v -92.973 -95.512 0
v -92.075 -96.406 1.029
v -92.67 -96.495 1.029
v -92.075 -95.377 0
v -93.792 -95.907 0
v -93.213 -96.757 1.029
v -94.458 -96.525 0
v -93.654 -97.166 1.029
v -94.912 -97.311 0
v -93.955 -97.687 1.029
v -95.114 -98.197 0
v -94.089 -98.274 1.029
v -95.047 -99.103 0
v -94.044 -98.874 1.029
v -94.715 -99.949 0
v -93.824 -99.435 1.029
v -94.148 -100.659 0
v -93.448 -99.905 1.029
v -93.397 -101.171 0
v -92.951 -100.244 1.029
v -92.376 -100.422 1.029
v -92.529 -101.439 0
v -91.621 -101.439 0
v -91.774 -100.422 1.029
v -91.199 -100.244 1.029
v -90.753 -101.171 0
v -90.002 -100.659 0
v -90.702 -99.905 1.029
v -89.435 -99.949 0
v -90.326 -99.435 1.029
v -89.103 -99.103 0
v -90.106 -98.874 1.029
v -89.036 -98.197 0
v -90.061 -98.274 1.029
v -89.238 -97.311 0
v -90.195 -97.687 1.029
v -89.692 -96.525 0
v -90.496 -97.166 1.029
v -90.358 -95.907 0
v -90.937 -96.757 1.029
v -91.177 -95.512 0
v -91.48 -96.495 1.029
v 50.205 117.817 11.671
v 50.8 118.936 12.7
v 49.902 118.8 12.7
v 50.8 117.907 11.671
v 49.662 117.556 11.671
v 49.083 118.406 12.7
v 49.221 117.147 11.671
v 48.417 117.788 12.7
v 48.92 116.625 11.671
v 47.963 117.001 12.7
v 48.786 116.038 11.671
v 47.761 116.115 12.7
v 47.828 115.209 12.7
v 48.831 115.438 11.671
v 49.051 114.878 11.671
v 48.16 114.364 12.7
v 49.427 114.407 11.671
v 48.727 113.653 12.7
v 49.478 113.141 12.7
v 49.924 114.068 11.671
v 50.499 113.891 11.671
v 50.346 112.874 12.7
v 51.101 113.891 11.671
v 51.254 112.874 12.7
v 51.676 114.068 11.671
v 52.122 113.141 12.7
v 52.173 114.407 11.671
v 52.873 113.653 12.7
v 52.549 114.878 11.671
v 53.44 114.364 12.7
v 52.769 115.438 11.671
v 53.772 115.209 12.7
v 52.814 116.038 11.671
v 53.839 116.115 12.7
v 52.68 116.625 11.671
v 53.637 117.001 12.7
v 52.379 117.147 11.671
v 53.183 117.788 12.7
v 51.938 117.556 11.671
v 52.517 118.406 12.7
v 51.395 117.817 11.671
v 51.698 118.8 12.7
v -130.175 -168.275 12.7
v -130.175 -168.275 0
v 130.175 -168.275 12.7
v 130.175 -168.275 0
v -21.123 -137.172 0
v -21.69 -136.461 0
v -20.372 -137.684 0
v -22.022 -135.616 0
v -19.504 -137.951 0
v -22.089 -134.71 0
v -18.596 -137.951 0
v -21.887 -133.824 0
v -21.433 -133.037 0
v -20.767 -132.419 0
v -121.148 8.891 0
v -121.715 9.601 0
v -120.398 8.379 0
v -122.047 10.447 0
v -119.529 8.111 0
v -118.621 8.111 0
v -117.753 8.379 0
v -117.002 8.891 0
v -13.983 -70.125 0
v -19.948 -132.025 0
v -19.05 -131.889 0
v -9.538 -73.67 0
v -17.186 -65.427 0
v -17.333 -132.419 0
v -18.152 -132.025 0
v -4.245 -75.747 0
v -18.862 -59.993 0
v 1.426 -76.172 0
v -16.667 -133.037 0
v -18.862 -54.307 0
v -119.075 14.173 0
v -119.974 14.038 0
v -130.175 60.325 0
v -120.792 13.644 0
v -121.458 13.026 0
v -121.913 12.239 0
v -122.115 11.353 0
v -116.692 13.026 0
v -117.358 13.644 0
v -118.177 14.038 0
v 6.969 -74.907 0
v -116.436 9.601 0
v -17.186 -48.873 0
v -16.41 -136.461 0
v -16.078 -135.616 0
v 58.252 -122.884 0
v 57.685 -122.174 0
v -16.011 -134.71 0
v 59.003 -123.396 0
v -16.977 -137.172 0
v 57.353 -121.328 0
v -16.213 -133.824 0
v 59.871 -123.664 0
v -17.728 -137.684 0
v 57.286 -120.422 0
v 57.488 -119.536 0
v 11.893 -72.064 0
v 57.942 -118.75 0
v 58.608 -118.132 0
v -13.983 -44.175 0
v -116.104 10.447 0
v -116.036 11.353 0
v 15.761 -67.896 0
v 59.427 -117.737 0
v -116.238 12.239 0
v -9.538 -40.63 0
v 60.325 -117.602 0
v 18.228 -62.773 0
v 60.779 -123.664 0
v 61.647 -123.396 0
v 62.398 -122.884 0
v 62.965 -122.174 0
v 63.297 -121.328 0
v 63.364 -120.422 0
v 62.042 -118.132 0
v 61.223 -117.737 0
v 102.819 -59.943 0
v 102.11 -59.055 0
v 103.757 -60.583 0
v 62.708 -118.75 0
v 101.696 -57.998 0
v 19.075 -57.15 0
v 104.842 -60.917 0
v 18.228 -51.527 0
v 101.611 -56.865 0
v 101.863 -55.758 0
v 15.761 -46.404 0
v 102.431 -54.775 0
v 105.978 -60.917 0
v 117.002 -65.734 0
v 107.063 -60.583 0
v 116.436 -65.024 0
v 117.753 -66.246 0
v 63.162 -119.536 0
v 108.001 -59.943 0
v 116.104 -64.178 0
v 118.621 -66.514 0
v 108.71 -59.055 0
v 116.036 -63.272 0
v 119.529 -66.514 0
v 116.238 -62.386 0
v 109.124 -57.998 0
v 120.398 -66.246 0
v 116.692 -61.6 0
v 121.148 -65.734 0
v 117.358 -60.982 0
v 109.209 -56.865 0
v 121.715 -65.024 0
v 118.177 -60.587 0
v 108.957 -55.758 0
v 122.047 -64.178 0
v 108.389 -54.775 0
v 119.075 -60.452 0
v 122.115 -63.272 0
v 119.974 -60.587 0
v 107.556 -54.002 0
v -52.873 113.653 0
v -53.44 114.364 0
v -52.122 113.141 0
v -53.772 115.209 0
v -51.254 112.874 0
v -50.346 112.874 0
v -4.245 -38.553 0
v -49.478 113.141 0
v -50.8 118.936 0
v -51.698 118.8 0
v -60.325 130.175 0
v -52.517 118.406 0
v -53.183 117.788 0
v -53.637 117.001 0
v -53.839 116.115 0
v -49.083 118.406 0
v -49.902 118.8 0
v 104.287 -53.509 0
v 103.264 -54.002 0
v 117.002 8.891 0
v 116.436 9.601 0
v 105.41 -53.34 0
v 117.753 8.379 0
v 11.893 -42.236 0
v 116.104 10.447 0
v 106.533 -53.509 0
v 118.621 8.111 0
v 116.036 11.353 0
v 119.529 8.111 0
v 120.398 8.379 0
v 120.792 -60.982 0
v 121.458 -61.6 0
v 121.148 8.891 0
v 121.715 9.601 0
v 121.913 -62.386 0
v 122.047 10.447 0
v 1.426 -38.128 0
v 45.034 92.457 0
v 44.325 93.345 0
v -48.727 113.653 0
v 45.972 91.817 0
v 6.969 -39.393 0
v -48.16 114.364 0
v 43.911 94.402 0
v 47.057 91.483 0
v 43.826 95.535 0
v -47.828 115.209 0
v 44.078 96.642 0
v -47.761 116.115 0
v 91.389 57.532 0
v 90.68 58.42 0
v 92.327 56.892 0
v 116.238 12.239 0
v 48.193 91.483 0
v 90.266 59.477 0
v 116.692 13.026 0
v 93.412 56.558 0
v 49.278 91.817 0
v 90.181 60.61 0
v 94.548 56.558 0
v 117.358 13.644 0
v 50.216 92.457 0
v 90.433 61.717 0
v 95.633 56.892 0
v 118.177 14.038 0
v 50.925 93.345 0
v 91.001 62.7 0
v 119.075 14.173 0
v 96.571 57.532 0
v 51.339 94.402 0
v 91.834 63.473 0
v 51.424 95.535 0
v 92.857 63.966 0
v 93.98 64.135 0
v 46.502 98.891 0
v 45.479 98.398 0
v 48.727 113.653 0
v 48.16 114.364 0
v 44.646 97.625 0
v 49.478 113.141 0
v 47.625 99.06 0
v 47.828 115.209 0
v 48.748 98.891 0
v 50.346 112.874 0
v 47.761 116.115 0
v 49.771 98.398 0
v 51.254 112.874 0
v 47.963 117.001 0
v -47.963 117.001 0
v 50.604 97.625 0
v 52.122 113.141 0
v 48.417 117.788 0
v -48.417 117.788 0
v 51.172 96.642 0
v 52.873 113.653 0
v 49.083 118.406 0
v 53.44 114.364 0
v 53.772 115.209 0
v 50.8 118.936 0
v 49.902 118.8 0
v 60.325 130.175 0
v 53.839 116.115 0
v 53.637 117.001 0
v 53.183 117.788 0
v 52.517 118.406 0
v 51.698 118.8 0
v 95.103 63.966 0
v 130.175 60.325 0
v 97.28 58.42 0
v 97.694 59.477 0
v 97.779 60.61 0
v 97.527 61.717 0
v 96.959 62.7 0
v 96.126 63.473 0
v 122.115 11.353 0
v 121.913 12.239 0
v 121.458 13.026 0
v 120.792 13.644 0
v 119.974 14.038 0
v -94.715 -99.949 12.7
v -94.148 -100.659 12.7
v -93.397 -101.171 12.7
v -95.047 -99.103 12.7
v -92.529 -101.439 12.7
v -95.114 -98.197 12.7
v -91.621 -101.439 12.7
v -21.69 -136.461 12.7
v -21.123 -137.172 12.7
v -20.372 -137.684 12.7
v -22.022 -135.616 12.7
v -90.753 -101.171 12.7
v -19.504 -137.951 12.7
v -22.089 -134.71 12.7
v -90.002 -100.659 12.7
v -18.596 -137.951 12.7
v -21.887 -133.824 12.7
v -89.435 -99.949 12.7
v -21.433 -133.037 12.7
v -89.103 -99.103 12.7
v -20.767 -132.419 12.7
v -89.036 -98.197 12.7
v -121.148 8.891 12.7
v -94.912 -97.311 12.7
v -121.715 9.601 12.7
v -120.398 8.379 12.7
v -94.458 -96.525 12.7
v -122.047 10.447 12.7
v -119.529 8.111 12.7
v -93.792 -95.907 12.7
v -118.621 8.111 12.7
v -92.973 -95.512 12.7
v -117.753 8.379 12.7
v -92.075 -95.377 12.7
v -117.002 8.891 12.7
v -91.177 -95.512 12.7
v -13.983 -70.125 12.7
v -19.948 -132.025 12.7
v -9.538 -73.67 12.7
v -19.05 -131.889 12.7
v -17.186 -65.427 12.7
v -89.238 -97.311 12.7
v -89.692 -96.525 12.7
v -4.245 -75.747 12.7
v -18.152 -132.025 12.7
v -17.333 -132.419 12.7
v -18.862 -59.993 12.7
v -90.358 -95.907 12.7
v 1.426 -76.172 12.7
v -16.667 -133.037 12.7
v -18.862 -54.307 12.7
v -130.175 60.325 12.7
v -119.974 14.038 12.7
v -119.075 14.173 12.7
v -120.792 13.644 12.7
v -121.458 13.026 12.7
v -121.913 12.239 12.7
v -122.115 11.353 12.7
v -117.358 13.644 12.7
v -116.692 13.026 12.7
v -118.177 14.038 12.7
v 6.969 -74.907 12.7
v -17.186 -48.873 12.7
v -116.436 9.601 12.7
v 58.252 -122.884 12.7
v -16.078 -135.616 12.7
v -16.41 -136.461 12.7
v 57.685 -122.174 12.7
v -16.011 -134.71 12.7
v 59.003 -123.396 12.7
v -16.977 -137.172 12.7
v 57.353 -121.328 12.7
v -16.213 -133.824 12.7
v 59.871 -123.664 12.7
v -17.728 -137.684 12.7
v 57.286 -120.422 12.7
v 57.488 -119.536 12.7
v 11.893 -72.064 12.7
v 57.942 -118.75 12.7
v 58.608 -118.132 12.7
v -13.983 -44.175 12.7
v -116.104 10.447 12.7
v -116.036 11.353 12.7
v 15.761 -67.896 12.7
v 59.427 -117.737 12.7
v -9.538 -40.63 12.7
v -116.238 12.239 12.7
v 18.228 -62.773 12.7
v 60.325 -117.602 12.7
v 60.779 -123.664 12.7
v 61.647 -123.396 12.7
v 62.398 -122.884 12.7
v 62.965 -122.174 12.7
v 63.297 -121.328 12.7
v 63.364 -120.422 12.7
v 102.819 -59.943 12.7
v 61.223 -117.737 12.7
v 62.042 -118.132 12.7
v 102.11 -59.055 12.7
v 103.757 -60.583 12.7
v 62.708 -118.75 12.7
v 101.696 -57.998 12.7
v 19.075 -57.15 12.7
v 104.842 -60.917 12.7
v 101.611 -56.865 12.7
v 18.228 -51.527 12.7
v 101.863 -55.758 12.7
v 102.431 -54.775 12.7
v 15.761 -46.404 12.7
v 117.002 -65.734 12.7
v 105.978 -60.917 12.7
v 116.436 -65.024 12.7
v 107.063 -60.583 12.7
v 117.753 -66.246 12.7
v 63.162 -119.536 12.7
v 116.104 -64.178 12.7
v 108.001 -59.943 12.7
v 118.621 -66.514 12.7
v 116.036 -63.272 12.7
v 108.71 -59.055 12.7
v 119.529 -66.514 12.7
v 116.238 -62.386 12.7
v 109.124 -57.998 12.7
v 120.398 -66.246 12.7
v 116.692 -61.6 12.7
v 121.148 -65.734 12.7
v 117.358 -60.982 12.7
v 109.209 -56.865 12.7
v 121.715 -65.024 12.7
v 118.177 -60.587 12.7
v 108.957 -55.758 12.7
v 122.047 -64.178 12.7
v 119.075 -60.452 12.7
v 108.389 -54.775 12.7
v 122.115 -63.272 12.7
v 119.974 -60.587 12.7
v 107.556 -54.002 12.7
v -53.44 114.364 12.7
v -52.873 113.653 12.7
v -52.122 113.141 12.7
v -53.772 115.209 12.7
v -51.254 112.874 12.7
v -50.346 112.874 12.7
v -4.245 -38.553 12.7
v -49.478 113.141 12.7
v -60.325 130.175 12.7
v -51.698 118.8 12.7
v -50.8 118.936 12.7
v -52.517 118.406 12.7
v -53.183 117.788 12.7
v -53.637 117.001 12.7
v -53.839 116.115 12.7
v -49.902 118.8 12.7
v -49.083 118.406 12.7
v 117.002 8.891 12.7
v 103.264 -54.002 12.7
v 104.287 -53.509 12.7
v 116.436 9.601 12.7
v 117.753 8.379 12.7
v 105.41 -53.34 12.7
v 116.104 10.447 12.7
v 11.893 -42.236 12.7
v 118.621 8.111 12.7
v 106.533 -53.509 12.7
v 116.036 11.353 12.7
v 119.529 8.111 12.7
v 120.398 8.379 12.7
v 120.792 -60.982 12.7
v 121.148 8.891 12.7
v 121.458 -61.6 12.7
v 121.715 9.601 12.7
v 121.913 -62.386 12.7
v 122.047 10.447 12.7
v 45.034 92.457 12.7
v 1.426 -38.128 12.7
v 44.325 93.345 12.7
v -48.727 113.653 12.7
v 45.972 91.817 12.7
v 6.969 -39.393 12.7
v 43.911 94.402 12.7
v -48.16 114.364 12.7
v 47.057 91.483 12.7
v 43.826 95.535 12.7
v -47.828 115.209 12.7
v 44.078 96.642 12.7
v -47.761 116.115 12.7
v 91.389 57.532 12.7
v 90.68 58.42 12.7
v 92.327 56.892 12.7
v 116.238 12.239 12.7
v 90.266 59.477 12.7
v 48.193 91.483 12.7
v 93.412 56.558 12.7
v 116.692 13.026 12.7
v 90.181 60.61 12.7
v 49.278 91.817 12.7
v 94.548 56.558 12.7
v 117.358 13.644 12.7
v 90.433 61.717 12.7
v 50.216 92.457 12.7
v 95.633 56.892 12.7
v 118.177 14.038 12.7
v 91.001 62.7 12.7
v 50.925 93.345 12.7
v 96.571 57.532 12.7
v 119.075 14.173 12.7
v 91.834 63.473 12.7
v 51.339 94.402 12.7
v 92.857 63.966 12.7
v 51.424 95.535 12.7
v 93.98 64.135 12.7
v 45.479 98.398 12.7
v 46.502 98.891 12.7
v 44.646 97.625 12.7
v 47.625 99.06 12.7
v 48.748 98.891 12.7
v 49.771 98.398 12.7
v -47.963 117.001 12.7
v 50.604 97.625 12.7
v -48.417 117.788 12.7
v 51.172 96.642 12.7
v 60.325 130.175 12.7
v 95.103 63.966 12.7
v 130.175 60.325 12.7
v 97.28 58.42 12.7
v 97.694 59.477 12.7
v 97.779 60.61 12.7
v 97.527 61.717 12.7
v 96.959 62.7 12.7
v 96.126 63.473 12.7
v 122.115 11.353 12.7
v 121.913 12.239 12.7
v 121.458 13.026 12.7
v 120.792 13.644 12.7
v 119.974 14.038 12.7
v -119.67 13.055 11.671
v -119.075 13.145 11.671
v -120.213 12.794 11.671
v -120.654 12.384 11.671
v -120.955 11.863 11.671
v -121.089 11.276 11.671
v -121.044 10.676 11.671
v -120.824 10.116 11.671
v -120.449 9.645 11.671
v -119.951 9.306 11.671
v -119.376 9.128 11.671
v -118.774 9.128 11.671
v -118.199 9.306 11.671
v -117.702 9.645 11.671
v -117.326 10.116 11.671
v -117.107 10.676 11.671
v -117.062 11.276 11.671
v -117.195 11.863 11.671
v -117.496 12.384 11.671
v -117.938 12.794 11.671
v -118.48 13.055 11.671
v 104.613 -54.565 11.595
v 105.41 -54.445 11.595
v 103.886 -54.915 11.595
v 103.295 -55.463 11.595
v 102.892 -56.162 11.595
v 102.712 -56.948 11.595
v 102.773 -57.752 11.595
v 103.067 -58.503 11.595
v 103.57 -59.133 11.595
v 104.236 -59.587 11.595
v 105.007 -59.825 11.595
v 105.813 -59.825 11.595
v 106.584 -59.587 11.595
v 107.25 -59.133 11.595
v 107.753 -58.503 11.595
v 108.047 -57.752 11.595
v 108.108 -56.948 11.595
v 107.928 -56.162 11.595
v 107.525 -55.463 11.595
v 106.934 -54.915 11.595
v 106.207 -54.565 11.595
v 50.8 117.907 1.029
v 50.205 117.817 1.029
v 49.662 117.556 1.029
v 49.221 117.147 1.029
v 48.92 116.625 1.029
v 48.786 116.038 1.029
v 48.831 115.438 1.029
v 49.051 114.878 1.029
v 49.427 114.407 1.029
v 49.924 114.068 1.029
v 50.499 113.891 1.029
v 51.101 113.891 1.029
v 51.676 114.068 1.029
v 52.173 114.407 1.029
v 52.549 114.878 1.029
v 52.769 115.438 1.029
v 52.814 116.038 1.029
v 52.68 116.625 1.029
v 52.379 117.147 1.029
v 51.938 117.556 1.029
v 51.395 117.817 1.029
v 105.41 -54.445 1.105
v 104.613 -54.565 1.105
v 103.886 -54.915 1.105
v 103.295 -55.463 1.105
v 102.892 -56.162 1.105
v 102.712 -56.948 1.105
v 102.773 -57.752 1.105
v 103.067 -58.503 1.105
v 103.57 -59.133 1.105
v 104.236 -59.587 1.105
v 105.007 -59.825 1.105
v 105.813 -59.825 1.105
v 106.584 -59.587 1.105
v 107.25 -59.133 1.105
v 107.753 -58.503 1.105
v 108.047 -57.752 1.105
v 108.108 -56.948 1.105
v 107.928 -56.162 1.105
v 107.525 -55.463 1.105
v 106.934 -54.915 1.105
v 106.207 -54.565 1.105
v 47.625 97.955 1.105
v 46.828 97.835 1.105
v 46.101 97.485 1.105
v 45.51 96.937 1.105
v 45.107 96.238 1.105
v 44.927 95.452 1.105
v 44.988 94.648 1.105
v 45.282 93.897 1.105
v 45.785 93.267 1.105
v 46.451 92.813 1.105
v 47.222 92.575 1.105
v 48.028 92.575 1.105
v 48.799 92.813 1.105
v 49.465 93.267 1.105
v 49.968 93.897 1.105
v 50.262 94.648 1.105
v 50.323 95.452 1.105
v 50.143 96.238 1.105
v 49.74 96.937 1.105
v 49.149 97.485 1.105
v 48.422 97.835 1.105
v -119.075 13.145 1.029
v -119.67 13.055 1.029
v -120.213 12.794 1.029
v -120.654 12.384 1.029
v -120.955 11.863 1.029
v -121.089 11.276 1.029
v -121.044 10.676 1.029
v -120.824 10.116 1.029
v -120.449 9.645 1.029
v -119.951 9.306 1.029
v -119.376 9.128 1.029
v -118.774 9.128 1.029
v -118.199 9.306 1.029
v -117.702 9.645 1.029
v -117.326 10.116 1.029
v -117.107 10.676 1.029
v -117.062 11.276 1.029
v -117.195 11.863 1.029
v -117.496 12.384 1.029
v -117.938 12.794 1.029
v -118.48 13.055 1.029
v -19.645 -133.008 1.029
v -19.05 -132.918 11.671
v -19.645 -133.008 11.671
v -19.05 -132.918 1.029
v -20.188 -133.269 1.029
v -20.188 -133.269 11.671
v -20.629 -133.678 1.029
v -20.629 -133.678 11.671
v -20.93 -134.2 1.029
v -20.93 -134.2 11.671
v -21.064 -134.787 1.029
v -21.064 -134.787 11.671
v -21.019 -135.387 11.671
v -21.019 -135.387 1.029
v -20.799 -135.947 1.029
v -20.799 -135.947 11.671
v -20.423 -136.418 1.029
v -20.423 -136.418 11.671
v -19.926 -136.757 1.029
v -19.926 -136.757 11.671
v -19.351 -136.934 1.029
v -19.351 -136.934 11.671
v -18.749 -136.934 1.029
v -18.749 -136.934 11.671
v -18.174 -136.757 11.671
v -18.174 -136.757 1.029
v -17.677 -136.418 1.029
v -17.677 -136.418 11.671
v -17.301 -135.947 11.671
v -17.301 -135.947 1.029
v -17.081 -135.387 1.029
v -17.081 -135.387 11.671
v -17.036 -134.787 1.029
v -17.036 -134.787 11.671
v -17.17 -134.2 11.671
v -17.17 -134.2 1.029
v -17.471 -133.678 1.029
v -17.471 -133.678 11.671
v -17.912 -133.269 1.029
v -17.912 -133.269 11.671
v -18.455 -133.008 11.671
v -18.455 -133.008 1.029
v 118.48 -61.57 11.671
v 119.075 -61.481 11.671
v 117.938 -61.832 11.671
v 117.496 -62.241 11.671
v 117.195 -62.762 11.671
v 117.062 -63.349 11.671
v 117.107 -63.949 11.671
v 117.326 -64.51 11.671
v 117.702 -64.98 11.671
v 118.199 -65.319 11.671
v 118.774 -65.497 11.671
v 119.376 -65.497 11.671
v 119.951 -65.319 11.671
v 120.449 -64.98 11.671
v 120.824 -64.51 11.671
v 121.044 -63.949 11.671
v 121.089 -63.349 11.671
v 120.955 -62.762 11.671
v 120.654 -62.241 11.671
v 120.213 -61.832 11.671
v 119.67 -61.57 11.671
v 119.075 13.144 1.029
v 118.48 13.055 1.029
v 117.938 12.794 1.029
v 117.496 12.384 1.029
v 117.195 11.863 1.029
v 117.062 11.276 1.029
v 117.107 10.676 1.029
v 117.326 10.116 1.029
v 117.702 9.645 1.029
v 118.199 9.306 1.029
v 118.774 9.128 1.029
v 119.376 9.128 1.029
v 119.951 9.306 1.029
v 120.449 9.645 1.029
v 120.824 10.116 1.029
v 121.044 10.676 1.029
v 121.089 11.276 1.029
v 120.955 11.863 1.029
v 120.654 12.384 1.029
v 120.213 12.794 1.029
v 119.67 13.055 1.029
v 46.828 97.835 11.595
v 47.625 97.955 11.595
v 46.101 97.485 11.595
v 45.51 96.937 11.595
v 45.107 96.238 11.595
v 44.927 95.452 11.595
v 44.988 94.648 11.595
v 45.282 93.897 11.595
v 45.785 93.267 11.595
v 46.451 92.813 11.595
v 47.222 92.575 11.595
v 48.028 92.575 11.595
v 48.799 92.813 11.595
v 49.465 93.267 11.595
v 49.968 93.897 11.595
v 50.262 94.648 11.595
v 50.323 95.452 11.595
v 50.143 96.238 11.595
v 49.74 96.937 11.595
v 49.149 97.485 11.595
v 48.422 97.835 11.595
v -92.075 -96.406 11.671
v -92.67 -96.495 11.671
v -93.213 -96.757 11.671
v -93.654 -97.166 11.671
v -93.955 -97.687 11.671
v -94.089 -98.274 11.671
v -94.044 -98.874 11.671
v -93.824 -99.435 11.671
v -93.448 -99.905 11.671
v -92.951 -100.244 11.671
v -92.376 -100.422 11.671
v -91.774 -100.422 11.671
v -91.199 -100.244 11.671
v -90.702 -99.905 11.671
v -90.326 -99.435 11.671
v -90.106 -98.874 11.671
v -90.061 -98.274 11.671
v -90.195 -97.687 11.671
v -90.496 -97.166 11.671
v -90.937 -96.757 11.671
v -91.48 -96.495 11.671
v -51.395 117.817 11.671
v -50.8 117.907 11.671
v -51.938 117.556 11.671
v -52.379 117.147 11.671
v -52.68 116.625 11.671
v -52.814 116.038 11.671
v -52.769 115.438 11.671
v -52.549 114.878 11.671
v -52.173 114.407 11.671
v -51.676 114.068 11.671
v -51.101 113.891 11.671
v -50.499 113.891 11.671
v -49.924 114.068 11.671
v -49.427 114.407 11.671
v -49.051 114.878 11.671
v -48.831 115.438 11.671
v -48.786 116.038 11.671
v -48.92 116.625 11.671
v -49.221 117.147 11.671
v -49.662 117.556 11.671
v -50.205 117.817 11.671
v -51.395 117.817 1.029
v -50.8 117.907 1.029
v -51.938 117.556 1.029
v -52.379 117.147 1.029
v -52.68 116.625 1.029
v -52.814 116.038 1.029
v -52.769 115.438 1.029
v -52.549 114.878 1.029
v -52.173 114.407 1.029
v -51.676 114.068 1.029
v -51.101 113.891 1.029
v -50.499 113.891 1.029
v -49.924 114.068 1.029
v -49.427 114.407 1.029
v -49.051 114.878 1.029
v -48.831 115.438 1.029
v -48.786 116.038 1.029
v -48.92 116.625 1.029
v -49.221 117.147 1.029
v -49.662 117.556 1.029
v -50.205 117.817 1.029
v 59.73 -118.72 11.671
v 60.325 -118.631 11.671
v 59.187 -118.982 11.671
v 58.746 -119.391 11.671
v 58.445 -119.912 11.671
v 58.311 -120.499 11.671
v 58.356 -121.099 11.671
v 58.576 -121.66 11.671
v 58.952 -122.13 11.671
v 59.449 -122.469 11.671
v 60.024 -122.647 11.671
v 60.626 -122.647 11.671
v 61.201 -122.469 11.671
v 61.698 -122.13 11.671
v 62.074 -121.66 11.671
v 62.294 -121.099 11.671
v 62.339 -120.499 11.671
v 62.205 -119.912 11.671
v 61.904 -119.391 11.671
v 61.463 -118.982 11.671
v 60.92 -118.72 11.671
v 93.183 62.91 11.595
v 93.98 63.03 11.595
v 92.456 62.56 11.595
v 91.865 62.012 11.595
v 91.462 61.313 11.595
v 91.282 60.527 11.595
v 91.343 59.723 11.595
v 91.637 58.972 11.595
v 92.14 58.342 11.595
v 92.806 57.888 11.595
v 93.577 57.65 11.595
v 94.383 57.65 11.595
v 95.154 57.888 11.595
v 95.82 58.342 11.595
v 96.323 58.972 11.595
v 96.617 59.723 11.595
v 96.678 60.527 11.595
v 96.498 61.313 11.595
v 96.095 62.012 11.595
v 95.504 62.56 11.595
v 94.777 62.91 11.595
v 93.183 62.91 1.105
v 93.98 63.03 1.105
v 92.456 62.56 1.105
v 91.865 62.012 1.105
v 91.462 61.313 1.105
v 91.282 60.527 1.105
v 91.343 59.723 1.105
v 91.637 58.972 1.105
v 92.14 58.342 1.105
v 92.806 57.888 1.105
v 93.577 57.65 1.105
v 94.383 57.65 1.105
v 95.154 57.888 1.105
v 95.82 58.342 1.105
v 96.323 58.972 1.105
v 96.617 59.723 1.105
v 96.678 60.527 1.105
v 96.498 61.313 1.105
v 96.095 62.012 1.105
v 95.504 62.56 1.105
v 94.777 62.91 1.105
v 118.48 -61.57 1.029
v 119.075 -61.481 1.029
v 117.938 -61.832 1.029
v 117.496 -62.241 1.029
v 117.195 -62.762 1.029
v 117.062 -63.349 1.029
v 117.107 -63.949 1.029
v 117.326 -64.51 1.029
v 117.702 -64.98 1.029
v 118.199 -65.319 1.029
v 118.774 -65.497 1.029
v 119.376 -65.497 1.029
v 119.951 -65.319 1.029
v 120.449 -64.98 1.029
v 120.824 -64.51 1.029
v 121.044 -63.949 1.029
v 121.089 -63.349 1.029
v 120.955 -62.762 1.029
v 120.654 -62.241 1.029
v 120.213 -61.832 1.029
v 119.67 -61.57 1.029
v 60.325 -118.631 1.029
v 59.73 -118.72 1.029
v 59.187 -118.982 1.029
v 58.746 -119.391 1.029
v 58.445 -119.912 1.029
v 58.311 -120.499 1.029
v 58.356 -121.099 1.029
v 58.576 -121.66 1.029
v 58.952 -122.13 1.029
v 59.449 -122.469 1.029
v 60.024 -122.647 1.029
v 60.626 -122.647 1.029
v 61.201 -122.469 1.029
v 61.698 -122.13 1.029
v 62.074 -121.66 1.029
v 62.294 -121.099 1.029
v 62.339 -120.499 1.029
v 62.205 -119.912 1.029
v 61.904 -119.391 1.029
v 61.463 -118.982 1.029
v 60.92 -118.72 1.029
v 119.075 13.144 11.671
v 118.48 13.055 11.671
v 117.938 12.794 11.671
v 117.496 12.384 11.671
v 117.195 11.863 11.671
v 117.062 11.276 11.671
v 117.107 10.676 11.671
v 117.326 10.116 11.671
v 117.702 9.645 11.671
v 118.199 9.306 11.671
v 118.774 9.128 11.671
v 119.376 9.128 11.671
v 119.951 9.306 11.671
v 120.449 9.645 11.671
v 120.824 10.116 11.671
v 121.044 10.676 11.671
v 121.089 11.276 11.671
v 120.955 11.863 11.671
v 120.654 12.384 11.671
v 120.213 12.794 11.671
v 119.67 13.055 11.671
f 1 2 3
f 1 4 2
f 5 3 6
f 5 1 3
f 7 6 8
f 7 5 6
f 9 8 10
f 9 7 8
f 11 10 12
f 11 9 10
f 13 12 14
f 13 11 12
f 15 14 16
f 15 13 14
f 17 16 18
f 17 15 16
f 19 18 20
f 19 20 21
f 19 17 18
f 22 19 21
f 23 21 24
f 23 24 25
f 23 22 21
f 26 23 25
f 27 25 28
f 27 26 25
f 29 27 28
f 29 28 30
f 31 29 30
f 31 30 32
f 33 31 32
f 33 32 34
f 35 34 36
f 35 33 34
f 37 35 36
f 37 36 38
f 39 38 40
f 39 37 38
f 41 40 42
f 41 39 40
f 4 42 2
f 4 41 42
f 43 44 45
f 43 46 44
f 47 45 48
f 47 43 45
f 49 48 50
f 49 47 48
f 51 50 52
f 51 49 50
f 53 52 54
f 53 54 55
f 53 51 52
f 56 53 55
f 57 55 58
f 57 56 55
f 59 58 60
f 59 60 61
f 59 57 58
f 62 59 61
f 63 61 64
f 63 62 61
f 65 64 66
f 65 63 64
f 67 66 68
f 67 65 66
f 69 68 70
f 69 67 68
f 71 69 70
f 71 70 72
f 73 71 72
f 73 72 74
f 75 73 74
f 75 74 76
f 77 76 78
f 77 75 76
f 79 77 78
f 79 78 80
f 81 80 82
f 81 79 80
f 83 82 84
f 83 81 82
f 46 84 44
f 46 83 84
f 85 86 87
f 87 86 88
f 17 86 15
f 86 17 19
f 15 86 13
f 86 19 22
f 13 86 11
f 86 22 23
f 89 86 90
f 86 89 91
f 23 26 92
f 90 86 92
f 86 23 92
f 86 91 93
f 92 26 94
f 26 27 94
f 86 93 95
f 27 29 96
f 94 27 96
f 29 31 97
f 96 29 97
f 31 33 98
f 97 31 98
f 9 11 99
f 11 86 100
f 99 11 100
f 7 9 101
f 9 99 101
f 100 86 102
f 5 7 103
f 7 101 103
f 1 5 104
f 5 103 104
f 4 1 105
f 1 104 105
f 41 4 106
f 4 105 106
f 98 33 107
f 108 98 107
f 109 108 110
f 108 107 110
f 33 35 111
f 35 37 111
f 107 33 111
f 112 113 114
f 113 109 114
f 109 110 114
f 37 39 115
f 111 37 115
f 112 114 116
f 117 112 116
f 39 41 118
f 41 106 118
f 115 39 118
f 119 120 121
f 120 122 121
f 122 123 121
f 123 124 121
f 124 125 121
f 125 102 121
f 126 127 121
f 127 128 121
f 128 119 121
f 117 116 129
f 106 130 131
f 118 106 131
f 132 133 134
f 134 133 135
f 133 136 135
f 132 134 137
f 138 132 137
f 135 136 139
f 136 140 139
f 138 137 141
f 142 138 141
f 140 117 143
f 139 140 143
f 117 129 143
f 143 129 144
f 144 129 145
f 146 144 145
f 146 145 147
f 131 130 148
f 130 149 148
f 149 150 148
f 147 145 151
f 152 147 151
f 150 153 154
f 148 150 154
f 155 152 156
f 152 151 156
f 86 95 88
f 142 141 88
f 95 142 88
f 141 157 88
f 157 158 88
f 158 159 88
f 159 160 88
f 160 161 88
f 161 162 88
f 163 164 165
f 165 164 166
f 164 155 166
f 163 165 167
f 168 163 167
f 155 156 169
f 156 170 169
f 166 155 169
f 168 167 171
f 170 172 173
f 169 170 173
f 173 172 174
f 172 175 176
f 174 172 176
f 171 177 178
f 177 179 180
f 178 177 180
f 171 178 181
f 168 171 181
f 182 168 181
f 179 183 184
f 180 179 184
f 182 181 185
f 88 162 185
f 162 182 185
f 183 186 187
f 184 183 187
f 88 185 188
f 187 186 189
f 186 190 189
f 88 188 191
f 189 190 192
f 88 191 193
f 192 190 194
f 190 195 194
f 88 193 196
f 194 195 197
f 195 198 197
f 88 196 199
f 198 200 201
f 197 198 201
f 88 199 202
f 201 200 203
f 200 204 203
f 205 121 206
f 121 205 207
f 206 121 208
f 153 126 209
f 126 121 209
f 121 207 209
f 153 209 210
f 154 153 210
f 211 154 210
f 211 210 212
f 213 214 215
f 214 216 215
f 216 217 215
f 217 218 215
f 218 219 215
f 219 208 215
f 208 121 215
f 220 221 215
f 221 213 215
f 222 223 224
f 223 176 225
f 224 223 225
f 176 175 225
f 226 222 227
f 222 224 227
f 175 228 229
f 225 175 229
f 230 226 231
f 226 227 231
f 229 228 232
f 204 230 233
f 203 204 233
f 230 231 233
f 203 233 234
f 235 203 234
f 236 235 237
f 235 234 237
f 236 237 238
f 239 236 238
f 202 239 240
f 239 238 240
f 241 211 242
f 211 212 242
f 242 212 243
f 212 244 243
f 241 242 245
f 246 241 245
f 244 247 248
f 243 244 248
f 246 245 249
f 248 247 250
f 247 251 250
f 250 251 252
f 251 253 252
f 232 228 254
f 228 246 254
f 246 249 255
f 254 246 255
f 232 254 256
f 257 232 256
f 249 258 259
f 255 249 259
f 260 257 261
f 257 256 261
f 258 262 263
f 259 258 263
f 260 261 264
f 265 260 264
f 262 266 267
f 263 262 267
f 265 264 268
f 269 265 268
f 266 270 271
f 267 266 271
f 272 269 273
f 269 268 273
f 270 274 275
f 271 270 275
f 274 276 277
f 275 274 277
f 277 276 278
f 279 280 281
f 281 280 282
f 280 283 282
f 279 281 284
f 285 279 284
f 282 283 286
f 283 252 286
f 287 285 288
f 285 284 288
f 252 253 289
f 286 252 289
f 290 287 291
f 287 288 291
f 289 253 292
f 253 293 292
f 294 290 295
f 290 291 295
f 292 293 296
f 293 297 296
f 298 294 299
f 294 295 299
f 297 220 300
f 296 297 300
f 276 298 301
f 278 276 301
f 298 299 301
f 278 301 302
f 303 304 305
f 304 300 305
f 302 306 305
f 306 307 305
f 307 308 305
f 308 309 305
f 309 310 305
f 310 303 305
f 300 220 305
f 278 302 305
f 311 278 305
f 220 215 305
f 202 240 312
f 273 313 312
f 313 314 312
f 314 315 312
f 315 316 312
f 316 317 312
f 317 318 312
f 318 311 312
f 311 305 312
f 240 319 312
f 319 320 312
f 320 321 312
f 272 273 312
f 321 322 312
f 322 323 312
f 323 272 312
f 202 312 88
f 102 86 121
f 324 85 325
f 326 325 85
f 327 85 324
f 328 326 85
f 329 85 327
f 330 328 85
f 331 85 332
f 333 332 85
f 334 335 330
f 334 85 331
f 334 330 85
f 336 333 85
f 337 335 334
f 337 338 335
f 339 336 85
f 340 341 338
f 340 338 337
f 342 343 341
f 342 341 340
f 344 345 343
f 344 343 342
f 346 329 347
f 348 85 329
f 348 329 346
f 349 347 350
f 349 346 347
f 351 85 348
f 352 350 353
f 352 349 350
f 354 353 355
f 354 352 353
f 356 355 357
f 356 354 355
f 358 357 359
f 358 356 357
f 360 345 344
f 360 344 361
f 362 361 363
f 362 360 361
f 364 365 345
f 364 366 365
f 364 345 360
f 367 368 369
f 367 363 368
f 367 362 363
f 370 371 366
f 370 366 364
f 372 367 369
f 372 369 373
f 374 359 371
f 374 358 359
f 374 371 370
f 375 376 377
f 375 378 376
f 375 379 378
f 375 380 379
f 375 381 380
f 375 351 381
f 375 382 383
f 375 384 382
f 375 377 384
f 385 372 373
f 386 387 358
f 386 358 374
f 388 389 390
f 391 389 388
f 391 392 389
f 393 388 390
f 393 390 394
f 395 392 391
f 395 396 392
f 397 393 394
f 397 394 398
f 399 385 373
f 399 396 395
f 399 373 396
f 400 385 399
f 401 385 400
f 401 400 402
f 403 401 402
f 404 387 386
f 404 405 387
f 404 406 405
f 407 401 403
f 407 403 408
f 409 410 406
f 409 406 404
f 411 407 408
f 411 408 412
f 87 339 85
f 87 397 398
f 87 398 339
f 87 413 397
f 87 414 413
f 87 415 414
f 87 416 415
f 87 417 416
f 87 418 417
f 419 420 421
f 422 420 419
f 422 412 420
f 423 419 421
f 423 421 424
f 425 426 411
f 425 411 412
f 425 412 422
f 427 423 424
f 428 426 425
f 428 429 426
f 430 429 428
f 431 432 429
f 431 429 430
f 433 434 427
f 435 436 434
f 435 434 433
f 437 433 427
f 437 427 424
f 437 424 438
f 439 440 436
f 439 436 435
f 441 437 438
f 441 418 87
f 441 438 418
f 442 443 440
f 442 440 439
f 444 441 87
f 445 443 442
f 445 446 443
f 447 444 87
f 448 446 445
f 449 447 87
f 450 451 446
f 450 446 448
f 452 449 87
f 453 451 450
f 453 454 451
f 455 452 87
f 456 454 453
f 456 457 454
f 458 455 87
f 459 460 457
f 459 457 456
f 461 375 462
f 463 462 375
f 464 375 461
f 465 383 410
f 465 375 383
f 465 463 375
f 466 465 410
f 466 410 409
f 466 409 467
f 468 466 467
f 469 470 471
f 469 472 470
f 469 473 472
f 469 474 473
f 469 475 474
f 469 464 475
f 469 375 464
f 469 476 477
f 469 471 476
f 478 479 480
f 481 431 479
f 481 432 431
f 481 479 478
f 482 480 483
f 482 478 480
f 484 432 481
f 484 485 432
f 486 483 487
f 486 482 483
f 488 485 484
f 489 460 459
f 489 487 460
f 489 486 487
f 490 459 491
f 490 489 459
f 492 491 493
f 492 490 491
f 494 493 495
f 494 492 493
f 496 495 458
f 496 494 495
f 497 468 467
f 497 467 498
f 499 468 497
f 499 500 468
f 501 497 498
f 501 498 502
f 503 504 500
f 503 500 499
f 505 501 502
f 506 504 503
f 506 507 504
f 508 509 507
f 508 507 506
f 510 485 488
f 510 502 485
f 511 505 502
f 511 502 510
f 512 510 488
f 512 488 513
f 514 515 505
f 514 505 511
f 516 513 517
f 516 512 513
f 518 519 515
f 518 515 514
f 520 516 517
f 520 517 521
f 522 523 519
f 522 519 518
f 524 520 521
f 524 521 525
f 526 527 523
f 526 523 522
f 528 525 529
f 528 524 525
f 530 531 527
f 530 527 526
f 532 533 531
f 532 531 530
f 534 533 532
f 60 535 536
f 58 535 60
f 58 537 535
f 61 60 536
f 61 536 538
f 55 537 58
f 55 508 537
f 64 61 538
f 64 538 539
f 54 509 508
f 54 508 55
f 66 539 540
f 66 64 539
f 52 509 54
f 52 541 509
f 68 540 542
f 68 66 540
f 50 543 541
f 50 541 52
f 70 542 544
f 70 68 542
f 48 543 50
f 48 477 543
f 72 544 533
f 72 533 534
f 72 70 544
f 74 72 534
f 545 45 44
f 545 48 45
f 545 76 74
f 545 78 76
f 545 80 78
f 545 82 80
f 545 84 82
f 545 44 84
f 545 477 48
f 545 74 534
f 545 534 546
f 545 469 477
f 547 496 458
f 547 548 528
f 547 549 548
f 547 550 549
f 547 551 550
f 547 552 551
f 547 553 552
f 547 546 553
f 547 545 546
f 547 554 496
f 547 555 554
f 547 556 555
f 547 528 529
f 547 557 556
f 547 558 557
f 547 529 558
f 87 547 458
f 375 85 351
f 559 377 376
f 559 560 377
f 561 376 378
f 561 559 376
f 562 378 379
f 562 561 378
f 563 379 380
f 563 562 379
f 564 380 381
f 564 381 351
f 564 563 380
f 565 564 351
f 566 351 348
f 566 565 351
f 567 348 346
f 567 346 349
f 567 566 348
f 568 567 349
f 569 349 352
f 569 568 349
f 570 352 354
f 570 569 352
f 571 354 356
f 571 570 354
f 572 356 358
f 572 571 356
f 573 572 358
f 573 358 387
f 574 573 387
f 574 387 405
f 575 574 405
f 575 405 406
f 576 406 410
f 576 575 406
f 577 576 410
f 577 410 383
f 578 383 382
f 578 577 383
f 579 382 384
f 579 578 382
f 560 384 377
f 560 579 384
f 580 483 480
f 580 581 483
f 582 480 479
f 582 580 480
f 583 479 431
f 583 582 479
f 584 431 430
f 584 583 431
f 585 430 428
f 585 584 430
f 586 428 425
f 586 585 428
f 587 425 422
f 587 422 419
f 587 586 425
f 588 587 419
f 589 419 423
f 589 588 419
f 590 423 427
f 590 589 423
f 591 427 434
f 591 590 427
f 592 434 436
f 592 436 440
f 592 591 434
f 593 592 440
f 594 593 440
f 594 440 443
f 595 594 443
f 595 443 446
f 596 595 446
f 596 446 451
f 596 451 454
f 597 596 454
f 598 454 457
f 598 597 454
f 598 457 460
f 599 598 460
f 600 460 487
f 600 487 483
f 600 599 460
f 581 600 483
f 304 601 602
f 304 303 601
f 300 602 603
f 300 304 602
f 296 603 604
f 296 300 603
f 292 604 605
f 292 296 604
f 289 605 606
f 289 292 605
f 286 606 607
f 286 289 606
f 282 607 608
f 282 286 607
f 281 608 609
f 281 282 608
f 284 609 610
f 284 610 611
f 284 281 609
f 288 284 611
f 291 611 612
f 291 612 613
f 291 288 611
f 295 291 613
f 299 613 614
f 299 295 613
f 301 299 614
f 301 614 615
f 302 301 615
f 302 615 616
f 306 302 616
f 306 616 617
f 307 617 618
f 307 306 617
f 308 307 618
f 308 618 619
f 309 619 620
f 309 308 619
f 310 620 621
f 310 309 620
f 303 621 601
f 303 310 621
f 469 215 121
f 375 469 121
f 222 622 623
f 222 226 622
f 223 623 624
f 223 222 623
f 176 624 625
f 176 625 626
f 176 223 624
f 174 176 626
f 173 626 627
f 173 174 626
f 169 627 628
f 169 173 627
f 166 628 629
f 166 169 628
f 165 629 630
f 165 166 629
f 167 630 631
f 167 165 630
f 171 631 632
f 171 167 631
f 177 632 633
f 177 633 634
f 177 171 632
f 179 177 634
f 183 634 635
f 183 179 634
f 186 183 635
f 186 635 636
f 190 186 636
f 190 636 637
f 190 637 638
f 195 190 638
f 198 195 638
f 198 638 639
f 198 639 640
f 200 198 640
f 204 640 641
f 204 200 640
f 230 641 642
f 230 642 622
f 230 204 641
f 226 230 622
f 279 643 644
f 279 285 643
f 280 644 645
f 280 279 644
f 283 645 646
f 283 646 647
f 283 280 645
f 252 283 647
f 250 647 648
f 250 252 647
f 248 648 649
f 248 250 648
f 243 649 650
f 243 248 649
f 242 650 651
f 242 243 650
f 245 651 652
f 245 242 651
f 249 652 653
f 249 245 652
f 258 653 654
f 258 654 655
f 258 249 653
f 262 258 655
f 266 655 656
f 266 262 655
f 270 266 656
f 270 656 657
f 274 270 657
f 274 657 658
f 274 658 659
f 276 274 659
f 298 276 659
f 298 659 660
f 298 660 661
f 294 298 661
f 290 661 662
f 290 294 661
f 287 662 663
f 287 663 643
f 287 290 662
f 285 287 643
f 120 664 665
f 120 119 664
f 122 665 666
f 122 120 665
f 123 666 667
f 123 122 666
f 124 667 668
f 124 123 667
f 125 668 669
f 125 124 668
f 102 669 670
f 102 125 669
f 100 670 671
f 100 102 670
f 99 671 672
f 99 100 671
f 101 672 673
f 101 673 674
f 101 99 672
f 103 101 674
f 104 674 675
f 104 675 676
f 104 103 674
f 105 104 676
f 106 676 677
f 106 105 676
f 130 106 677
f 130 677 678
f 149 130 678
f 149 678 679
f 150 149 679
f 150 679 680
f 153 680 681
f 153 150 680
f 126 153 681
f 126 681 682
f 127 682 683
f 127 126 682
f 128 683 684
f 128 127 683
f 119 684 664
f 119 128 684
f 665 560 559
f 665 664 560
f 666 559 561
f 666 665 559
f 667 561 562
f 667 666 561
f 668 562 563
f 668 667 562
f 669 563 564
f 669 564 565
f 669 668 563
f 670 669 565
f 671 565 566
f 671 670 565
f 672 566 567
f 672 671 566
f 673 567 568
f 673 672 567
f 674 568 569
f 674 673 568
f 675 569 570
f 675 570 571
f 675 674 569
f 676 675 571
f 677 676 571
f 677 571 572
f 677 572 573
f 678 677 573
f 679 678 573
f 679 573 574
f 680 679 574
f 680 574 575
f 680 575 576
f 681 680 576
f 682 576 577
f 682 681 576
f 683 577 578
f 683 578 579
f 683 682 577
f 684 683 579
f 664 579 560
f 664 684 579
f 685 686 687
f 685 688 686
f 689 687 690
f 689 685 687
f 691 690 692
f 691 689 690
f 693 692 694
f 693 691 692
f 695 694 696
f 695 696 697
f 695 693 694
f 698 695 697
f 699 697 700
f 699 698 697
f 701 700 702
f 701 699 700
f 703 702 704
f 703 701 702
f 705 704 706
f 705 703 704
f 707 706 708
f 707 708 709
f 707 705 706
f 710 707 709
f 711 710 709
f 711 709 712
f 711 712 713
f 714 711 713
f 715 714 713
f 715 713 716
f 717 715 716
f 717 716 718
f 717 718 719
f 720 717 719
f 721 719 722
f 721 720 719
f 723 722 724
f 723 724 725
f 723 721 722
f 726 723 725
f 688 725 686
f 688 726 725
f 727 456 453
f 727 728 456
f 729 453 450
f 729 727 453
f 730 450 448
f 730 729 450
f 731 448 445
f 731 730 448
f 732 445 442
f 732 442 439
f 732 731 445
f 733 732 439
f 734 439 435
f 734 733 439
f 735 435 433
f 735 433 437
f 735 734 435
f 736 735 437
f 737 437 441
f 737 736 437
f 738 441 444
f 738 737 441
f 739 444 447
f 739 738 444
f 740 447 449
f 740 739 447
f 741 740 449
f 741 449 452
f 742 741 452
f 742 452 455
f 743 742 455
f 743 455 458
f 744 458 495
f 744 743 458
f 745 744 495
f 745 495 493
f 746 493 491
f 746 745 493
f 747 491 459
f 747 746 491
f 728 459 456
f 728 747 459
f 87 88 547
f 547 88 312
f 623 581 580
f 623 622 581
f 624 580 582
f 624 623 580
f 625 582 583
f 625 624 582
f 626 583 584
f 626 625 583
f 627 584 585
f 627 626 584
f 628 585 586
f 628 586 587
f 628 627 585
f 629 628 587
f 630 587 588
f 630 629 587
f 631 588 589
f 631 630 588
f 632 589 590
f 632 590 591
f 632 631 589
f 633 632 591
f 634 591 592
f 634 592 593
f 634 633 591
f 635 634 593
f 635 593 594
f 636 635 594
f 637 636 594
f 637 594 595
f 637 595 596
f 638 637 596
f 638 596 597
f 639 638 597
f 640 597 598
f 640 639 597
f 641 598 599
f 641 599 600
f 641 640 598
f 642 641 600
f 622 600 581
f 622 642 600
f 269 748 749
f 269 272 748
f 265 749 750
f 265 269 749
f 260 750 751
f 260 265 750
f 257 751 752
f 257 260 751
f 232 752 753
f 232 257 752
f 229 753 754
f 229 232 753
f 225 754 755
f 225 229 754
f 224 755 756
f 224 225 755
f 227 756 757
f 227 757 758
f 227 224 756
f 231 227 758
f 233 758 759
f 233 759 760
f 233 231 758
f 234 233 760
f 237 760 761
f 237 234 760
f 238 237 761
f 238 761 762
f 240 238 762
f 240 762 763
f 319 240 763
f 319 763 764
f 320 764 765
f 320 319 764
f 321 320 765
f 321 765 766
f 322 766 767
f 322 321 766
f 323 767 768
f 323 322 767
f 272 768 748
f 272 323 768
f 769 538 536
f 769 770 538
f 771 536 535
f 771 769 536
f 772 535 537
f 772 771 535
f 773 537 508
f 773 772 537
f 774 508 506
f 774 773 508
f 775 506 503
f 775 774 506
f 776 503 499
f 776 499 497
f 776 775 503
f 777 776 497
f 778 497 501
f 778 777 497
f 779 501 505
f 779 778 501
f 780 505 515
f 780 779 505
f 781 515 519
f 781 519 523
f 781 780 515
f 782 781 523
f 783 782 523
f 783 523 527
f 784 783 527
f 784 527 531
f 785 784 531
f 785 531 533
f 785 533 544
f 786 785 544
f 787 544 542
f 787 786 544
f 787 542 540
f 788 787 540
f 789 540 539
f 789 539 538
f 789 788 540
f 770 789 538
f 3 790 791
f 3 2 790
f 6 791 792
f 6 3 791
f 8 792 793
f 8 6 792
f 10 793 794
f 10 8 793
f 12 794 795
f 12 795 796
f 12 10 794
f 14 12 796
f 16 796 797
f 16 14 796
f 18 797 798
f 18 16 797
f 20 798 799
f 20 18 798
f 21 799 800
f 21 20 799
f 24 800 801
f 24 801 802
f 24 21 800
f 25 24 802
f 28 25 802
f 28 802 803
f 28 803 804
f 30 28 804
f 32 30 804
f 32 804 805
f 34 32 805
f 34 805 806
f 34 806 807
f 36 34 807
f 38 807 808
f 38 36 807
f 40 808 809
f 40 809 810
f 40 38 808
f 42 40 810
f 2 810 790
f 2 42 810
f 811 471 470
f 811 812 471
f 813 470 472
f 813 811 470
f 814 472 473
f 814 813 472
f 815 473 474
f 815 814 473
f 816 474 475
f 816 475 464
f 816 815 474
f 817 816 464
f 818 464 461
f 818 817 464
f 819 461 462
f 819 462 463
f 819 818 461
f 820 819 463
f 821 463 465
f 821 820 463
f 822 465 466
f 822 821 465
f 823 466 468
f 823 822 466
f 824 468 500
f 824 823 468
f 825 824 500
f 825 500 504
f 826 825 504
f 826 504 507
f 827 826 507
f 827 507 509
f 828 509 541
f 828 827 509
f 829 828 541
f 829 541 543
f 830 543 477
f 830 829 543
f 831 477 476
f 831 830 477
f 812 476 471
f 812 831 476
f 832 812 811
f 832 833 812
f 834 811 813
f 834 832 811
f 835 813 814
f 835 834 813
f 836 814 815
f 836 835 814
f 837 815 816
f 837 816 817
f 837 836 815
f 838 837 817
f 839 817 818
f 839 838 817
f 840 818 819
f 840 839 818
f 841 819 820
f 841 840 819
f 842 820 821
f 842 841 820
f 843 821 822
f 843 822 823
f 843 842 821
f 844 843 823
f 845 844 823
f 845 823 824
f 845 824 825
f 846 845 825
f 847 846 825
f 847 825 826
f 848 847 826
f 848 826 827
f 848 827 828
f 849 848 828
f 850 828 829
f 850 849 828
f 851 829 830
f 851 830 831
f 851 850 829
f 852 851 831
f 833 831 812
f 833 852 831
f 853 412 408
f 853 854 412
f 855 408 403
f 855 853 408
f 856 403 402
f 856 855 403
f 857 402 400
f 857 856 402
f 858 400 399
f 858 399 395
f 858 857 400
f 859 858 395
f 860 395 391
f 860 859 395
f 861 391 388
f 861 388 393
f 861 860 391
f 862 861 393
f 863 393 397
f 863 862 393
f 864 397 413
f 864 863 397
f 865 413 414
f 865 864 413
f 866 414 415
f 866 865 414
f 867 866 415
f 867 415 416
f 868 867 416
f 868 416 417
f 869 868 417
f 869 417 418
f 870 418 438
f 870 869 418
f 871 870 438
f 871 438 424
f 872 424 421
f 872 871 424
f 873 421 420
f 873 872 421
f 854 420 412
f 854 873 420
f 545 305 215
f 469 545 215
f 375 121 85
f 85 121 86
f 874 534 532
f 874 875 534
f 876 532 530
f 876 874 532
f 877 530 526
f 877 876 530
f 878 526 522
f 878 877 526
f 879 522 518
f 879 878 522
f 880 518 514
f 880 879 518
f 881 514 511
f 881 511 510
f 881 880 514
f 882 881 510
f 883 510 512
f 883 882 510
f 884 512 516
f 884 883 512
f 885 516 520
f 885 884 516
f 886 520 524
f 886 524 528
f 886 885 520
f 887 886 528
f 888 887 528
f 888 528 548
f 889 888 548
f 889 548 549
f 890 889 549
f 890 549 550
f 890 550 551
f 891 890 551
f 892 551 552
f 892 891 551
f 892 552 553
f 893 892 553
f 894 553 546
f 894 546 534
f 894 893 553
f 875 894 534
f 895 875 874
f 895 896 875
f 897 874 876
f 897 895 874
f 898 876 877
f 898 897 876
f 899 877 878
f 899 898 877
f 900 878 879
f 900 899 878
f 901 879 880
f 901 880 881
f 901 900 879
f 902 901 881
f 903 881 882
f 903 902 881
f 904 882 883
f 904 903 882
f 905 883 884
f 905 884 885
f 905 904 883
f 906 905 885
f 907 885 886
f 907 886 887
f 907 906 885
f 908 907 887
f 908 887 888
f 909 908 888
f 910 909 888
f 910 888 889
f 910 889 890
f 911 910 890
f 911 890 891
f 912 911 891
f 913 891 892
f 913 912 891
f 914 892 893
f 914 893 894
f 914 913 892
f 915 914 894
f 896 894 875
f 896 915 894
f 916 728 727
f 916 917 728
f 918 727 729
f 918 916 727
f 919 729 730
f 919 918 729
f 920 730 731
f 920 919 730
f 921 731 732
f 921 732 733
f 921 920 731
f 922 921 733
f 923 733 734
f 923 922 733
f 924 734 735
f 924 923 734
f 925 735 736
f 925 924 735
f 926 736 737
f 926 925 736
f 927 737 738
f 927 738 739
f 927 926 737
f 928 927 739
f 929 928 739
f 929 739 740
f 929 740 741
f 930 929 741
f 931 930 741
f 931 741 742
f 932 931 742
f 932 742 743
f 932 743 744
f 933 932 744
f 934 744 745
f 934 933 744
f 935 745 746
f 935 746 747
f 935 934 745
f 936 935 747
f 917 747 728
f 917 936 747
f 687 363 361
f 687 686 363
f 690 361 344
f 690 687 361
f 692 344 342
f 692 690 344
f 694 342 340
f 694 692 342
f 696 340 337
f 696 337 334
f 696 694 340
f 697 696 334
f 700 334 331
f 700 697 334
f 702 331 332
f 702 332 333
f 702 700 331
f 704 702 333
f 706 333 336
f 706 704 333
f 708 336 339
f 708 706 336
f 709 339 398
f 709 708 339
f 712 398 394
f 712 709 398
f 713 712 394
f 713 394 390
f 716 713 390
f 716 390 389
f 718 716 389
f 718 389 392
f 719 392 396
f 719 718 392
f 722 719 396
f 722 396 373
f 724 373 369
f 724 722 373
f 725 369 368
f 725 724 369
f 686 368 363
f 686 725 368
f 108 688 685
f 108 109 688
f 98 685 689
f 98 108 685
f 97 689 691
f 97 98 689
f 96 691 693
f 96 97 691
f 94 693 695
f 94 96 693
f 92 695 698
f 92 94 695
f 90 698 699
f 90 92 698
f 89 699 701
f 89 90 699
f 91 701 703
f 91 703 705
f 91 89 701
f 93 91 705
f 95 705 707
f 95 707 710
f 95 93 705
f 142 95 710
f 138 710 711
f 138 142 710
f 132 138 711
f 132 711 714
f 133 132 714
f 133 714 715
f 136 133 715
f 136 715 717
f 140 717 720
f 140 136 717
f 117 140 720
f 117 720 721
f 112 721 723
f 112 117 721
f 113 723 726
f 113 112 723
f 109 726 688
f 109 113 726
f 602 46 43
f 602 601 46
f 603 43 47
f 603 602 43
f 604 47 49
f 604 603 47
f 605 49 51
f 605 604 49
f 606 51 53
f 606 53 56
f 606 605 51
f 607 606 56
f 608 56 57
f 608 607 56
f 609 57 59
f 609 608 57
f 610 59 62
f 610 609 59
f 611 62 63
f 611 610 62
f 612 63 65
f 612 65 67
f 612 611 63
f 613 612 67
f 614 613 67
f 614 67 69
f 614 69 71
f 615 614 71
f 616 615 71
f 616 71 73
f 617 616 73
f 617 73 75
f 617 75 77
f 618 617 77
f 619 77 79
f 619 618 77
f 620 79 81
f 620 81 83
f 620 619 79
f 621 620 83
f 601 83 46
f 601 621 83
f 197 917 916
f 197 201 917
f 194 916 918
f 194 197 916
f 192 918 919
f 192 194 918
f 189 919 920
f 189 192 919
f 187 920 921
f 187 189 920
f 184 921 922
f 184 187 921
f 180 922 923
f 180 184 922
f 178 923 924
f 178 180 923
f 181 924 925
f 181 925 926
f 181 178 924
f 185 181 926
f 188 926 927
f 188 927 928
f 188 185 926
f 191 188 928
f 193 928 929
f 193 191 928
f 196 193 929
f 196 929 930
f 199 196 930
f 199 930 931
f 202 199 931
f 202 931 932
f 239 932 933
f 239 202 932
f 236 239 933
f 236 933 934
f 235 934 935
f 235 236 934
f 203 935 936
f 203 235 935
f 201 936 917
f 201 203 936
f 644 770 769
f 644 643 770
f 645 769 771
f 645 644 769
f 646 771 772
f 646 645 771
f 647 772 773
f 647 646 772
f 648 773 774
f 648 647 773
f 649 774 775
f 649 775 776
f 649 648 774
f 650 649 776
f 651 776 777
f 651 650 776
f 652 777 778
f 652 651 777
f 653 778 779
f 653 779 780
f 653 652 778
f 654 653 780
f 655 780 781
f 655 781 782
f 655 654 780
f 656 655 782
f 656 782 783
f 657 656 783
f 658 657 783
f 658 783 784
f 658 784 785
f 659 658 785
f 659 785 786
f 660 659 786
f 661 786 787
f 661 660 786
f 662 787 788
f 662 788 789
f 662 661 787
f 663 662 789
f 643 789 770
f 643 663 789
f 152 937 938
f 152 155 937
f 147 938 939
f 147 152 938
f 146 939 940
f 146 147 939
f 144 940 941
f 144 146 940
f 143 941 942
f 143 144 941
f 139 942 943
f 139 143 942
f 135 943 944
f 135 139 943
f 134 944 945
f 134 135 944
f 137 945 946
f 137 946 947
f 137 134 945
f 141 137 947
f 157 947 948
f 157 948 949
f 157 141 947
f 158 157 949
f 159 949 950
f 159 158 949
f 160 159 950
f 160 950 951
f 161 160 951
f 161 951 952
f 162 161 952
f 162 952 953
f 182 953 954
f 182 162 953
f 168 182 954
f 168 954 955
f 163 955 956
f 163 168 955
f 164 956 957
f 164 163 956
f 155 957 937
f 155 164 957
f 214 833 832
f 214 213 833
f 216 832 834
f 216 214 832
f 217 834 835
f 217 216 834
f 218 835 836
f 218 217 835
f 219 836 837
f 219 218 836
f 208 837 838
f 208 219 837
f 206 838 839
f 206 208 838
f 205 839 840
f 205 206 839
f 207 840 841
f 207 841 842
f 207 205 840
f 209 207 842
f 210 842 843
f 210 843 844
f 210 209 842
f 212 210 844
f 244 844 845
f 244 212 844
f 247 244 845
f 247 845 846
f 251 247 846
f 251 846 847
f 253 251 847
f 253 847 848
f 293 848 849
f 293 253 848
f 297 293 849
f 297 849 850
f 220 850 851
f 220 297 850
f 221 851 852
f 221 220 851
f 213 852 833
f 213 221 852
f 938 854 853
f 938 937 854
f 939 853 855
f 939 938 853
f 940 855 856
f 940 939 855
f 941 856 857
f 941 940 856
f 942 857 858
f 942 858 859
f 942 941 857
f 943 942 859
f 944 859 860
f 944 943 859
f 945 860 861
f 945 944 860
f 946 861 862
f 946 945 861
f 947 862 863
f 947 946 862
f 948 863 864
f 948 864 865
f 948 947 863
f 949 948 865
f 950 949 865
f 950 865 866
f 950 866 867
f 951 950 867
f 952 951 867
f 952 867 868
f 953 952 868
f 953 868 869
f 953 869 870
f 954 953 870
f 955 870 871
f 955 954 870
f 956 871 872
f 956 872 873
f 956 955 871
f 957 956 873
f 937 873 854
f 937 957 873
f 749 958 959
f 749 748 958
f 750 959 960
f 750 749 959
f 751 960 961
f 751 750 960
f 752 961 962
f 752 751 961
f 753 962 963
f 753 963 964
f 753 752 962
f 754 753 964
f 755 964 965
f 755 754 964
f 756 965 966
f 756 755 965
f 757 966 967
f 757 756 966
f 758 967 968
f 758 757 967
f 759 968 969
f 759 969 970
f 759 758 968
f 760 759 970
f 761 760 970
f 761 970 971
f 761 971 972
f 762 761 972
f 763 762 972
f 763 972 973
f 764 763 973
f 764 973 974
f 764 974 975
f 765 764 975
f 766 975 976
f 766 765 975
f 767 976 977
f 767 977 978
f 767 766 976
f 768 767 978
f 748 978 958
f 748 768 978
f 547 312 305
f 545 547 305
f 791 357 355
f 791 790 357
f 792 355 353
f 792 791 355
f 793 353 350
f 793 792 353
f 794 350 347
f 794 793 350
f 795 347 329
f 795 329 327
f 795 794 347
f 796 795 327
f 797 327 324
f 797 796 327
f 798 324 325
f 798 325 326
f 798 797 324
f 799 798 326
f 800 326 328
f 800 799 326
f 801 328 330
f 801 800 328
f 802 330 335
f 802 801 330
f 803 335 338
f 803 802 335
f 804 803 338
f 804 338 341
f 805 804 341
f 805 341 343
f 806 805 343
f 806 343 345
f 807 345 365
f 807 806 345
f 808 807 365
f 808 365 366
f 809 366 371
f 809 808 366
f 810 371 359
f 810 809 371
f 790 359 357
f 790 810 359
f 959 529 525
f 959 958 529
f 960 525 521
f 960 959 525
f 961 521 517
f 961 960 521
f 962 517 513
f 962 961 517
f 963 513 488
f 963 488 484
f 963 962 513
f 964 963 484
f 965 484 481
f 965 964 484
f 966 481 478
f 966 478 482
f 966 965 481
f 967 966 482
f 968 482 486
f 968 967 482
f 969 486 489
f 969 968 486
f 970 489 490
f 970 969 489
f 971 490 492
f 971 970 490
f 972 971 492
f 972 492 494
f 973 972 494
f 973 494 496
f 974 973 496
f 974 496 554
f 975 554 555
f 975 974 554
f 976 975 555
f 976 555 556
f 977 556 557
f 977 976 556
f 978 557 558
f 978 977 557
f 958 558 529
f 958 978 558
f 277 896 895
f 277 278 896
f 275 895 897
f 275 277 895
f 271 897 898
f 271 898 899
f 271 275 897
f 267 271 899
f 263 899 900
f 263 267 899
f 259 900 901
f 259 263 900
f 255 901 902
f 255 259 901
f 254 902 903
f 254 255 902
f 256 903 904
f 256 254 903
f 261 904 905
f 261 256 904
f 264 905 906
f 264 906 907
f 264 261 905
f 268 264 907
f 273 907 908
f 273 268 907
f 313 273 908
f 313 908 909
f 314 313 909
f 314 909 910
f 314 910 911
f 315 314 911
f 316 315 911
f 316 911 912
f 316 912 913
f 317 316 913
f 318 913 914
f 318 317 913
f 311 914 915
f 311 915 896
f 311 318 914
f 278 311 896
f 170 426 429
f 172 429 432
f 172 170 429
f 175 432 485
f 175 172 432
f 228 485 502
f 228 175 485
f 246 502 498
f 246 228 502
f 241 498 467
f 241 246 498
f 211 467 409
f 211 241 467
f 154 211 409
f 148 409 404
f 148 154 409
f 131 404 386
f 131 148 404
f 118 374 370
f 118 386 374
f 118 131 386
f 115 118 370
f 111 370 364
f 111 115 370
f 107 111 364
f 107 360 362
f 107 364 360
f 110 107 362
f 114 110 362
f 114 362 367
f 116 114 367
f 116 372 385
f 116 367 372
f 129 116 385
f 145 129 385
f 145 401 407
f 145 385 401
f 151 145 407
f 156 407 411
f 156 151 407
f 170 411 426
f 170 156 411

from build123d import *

# Parameters (mm, degrees)
BOSS_EXTRUDE1_DEPTH              = 12.7
SKETCH2_R                        = 19.0754
CUT_EXTRUDE2_DEPTH               = 214.127417875
F_10_32_TAPPED_HOLE2_AT_2_COUNT  = 2
F_10_32_TAPPED_HOLE2_AT_2_PITCH  = 101.6
F_10_32_TAPPED_HOLE2_AT_3_COUNT  = 2
F_10_32_TAPPED_HOLE2_AT_3_PITCH  = 199.581369562
F_10_32_TAPPED_HOLE2_AT_4_COUNT  = 2
F_10_32_TAPPED_HOLE2_AT_4_PITCH  = 257.571569241
F_10_32_TAPPED_HOLE2_AT_5_COUNT  = 2
F_10_32_TAPPED_HOLE2_AT_5_PITCH  = 260.369359036
F_10_32_TAPPED_HOLE2_AT_6_COUNT  = 2
F_10_32_TAPPED_HOLE2_AT_6_PITCH  = 236.729200842
F_10_32_TAPPED_HOLE2_AT_7_COUNT  = 2
F_10_32_TAPPED_HOLE2_AT_7_PITCH  = 125.046561074
F_10_32_TAPPED_HOLE2_AT_8_COUNT  = 2
F_10_32_TAPPED_HOLE2_AT_8_PITCH  = 191.941079739
F_1_4_28_TAPPED_HOLE1_AT_2_COUNT = 2
F_1_4_28_TAPPED_HOLE1_AT_2_PITCH = 118.029744238
F_1_4_28_TAPPED_HOLE1_AT_3_COUNT = 2
F_1_4_28_TAPPED_HOLE1_AT_3_PITCH = 162.987319215


with BuildPart() as part:
    # Sketch1 → Boss-Extrude1 (new body)
    with BuildSketch(Plane.XY):
        Polygon((-130.175, -168.275), (130.175, -168.275), (130.175, 60.325), (60.325, 130.175), (-60.325, 130.175), (-130.175, 60.325), align=None)
    extrude(amount=BOSS_EXTRUDE1_DEPTH)

    # Sketch2 → Cut-Extrude2 (cut, through all)
    with BuildSketch(Plane.XY):
        with Locations((0, -57.15)):
            Circle(SKETCH2_R)
    extrude(amount=CUT_EXTRUDE2_DEPTH, mode=Mode.SUBTRACT)

    # Sketch5 → #10-32 Tapped Hole2 (revolve, cut)
    with BuildSketch(Plane(origin=(50.8, 115.8875, 0), x_dir=(0, 1, 0), z_dir=(1, 0, 0))):
        Polygon((0, 0), (0, 12.7), (3.048, 12.7), (2.0193, 11.6713), (2.0193, 1.0287), (3.048, 0), align=None)
    f_10_32_tapped_hole2 = revolve(axis=Axis((50.8, 115.8875, -6.35), (0, 0, 1)), mode=Mode.SUBTRACT)

    # #10-32 Tapped Hole2 at 2: #10-32 Tapped Hole2 ×2
    with Locations(*[(-i * F_10_32_TAPPED_HOLE2_AT_2_PITCH, 0, 0) for i in range(1, F_10_32_TAPPED_HOLE2_AT_2_COUNT)]):
        add(f_10_32_tapped_hole2, mode=Mode.SUBTRACT)

    # #10-32 Tapped Hole2 at 3: #10-32 Tapped Hole2 ×2
    with Locations(*[Vector(-0.8511576023985749, -0.5249102169696354, 0) * (i * F_10_32_TAPPED_HOLE2_AT_3_PITCH) for i in range(1, F_10_32_TAPPED_HOLE2_AT_3_COUNT)]):
        add(f_10_32_tapped_hole2, mode=Mode.SUBTRACT)

    # #10-32 Tapped Hole2 at 4: #10-32 Tapped Hole2 ×2
    with Locations(*[Vector(-0.5547001962252293, -0.8320502943378437, 0) * (i * F_10_32_TAPPED_HOLE2_AT_4_PITCH) for i in range(1, F_10_32_TAPPED_HOLE2_AT_4_COUNT)]):
        add(f_10_32_tapped_hole2, mode=Mode.SUBTRACT)

    # #10-32 Tapped Hole2 at 5: #10-32 Tapped Hole2 ×2
    with Locations(*[Vector(-0.26827273477386476, -0.963343002142514, 0) * (i * F_10_32_TAPPED_HOLE2_AT_5_PITCH) for i in range(1, F_10_32_TAPPED_HOLE2_AT_5_COUNT)]):
        add(f_10_32_tapped_hole2, mode=Mode.SUBTRACT)

    # #10-32 Tapped Hole2 at 6: #10-32 Tapped Hole2 ×2
    with Locations(*[Vector(0.04023584739915886, -0.9991902104124478, 0) * (i * F_10_32_TAPPED_HOLE2_AT_6_PITCH) for i in range(1, F_10_32_TAPPED_HOLE2_AT_6_COUNT)]):
        add(f_10_32_tapped_hole2, mode=Mode.SUBTRACT)

    # #10-32 Tapped Hole2 at 7: #10-32 Tapped Hole2 ×2
    with Locations(*[Vector(0.5459982218929023, -0.8377863341507721, 0) * (i * F_10_32_TAPPED_HOLE2_AT_7_PITCH) for i in range(1, F_10_32_TAPPED_HOLE2_AT_7_COUNT)]):
        add(f_10_32_tapped_hole2, mode=Mode.SUBTRACT)

    # #10-32 Tapped Hole2 at 8: #10-32 Tapped Hole2 ×2
    with Locations(*[Vector(0.35570915873202924, -0.9345967014676182, 0) * (i * F_10_32_TAPPED_HOLE2_AT_8_PITCH) for i in range(1, F_10_32_TAPPED_HOLE2_AT_8_COUNT)]):
        add(f_10_32_tapped_hole2, mode=Mode.SUBTRACT)

    # Sketch7 → 1/4-28 Tapped Hole1 (revolve, cut)
    with BuildSketch(Plane(origin=(105.41, -57.15, 0), x_dir=(0, 1, 0), z_dir=(1, 0, 0))):
        Polygon((0, 0), (0, 12.7), (3.81, 12.7), (2.7051, 11.5951), (2.7051, 1.1049), (3.81, 0), align=None)
    f_1_4_28_tapped_hole1 = revolve(axis=Axis((105.41, -57.15, -6.35), (0, 0, 1)), mode=Mode.SUBTRACT)

    # 1/4-28 Tapped Hole1 at 2: 1/4-28 Tapped Hole1 ×2
    with Locations(*[Vector(-0.09683999633944815, 0.9952999623776622, 0) * (i * F_1_4_28_TAPPED_HOLE1_AT_2_PITCH) for i in range(1, F_1_4_28_TAPPED_HOLE1_AT_2_COUNT)]):
        add(f_1_4_28_tapped_hole1, mode=Mode.SUBTRACT)

    # 1/4-28 Tapped Hole1 at 3: 1/4-28 Tapped Hole1 ×2
    with Locations(*[Vector(-0.35453678407740086, 0.9350420678964421, 0) * (i * F_1_4_28_TAPPED_HOLE1_AT_3_PITCH) for i in range(1, F_1_4_28_TAPPED_HOLE1_AT_3_COUNT)]):
        add(f_1_4_28_tapped_hole1, mode=Mode.SUBTRACT)


solid = part.part
